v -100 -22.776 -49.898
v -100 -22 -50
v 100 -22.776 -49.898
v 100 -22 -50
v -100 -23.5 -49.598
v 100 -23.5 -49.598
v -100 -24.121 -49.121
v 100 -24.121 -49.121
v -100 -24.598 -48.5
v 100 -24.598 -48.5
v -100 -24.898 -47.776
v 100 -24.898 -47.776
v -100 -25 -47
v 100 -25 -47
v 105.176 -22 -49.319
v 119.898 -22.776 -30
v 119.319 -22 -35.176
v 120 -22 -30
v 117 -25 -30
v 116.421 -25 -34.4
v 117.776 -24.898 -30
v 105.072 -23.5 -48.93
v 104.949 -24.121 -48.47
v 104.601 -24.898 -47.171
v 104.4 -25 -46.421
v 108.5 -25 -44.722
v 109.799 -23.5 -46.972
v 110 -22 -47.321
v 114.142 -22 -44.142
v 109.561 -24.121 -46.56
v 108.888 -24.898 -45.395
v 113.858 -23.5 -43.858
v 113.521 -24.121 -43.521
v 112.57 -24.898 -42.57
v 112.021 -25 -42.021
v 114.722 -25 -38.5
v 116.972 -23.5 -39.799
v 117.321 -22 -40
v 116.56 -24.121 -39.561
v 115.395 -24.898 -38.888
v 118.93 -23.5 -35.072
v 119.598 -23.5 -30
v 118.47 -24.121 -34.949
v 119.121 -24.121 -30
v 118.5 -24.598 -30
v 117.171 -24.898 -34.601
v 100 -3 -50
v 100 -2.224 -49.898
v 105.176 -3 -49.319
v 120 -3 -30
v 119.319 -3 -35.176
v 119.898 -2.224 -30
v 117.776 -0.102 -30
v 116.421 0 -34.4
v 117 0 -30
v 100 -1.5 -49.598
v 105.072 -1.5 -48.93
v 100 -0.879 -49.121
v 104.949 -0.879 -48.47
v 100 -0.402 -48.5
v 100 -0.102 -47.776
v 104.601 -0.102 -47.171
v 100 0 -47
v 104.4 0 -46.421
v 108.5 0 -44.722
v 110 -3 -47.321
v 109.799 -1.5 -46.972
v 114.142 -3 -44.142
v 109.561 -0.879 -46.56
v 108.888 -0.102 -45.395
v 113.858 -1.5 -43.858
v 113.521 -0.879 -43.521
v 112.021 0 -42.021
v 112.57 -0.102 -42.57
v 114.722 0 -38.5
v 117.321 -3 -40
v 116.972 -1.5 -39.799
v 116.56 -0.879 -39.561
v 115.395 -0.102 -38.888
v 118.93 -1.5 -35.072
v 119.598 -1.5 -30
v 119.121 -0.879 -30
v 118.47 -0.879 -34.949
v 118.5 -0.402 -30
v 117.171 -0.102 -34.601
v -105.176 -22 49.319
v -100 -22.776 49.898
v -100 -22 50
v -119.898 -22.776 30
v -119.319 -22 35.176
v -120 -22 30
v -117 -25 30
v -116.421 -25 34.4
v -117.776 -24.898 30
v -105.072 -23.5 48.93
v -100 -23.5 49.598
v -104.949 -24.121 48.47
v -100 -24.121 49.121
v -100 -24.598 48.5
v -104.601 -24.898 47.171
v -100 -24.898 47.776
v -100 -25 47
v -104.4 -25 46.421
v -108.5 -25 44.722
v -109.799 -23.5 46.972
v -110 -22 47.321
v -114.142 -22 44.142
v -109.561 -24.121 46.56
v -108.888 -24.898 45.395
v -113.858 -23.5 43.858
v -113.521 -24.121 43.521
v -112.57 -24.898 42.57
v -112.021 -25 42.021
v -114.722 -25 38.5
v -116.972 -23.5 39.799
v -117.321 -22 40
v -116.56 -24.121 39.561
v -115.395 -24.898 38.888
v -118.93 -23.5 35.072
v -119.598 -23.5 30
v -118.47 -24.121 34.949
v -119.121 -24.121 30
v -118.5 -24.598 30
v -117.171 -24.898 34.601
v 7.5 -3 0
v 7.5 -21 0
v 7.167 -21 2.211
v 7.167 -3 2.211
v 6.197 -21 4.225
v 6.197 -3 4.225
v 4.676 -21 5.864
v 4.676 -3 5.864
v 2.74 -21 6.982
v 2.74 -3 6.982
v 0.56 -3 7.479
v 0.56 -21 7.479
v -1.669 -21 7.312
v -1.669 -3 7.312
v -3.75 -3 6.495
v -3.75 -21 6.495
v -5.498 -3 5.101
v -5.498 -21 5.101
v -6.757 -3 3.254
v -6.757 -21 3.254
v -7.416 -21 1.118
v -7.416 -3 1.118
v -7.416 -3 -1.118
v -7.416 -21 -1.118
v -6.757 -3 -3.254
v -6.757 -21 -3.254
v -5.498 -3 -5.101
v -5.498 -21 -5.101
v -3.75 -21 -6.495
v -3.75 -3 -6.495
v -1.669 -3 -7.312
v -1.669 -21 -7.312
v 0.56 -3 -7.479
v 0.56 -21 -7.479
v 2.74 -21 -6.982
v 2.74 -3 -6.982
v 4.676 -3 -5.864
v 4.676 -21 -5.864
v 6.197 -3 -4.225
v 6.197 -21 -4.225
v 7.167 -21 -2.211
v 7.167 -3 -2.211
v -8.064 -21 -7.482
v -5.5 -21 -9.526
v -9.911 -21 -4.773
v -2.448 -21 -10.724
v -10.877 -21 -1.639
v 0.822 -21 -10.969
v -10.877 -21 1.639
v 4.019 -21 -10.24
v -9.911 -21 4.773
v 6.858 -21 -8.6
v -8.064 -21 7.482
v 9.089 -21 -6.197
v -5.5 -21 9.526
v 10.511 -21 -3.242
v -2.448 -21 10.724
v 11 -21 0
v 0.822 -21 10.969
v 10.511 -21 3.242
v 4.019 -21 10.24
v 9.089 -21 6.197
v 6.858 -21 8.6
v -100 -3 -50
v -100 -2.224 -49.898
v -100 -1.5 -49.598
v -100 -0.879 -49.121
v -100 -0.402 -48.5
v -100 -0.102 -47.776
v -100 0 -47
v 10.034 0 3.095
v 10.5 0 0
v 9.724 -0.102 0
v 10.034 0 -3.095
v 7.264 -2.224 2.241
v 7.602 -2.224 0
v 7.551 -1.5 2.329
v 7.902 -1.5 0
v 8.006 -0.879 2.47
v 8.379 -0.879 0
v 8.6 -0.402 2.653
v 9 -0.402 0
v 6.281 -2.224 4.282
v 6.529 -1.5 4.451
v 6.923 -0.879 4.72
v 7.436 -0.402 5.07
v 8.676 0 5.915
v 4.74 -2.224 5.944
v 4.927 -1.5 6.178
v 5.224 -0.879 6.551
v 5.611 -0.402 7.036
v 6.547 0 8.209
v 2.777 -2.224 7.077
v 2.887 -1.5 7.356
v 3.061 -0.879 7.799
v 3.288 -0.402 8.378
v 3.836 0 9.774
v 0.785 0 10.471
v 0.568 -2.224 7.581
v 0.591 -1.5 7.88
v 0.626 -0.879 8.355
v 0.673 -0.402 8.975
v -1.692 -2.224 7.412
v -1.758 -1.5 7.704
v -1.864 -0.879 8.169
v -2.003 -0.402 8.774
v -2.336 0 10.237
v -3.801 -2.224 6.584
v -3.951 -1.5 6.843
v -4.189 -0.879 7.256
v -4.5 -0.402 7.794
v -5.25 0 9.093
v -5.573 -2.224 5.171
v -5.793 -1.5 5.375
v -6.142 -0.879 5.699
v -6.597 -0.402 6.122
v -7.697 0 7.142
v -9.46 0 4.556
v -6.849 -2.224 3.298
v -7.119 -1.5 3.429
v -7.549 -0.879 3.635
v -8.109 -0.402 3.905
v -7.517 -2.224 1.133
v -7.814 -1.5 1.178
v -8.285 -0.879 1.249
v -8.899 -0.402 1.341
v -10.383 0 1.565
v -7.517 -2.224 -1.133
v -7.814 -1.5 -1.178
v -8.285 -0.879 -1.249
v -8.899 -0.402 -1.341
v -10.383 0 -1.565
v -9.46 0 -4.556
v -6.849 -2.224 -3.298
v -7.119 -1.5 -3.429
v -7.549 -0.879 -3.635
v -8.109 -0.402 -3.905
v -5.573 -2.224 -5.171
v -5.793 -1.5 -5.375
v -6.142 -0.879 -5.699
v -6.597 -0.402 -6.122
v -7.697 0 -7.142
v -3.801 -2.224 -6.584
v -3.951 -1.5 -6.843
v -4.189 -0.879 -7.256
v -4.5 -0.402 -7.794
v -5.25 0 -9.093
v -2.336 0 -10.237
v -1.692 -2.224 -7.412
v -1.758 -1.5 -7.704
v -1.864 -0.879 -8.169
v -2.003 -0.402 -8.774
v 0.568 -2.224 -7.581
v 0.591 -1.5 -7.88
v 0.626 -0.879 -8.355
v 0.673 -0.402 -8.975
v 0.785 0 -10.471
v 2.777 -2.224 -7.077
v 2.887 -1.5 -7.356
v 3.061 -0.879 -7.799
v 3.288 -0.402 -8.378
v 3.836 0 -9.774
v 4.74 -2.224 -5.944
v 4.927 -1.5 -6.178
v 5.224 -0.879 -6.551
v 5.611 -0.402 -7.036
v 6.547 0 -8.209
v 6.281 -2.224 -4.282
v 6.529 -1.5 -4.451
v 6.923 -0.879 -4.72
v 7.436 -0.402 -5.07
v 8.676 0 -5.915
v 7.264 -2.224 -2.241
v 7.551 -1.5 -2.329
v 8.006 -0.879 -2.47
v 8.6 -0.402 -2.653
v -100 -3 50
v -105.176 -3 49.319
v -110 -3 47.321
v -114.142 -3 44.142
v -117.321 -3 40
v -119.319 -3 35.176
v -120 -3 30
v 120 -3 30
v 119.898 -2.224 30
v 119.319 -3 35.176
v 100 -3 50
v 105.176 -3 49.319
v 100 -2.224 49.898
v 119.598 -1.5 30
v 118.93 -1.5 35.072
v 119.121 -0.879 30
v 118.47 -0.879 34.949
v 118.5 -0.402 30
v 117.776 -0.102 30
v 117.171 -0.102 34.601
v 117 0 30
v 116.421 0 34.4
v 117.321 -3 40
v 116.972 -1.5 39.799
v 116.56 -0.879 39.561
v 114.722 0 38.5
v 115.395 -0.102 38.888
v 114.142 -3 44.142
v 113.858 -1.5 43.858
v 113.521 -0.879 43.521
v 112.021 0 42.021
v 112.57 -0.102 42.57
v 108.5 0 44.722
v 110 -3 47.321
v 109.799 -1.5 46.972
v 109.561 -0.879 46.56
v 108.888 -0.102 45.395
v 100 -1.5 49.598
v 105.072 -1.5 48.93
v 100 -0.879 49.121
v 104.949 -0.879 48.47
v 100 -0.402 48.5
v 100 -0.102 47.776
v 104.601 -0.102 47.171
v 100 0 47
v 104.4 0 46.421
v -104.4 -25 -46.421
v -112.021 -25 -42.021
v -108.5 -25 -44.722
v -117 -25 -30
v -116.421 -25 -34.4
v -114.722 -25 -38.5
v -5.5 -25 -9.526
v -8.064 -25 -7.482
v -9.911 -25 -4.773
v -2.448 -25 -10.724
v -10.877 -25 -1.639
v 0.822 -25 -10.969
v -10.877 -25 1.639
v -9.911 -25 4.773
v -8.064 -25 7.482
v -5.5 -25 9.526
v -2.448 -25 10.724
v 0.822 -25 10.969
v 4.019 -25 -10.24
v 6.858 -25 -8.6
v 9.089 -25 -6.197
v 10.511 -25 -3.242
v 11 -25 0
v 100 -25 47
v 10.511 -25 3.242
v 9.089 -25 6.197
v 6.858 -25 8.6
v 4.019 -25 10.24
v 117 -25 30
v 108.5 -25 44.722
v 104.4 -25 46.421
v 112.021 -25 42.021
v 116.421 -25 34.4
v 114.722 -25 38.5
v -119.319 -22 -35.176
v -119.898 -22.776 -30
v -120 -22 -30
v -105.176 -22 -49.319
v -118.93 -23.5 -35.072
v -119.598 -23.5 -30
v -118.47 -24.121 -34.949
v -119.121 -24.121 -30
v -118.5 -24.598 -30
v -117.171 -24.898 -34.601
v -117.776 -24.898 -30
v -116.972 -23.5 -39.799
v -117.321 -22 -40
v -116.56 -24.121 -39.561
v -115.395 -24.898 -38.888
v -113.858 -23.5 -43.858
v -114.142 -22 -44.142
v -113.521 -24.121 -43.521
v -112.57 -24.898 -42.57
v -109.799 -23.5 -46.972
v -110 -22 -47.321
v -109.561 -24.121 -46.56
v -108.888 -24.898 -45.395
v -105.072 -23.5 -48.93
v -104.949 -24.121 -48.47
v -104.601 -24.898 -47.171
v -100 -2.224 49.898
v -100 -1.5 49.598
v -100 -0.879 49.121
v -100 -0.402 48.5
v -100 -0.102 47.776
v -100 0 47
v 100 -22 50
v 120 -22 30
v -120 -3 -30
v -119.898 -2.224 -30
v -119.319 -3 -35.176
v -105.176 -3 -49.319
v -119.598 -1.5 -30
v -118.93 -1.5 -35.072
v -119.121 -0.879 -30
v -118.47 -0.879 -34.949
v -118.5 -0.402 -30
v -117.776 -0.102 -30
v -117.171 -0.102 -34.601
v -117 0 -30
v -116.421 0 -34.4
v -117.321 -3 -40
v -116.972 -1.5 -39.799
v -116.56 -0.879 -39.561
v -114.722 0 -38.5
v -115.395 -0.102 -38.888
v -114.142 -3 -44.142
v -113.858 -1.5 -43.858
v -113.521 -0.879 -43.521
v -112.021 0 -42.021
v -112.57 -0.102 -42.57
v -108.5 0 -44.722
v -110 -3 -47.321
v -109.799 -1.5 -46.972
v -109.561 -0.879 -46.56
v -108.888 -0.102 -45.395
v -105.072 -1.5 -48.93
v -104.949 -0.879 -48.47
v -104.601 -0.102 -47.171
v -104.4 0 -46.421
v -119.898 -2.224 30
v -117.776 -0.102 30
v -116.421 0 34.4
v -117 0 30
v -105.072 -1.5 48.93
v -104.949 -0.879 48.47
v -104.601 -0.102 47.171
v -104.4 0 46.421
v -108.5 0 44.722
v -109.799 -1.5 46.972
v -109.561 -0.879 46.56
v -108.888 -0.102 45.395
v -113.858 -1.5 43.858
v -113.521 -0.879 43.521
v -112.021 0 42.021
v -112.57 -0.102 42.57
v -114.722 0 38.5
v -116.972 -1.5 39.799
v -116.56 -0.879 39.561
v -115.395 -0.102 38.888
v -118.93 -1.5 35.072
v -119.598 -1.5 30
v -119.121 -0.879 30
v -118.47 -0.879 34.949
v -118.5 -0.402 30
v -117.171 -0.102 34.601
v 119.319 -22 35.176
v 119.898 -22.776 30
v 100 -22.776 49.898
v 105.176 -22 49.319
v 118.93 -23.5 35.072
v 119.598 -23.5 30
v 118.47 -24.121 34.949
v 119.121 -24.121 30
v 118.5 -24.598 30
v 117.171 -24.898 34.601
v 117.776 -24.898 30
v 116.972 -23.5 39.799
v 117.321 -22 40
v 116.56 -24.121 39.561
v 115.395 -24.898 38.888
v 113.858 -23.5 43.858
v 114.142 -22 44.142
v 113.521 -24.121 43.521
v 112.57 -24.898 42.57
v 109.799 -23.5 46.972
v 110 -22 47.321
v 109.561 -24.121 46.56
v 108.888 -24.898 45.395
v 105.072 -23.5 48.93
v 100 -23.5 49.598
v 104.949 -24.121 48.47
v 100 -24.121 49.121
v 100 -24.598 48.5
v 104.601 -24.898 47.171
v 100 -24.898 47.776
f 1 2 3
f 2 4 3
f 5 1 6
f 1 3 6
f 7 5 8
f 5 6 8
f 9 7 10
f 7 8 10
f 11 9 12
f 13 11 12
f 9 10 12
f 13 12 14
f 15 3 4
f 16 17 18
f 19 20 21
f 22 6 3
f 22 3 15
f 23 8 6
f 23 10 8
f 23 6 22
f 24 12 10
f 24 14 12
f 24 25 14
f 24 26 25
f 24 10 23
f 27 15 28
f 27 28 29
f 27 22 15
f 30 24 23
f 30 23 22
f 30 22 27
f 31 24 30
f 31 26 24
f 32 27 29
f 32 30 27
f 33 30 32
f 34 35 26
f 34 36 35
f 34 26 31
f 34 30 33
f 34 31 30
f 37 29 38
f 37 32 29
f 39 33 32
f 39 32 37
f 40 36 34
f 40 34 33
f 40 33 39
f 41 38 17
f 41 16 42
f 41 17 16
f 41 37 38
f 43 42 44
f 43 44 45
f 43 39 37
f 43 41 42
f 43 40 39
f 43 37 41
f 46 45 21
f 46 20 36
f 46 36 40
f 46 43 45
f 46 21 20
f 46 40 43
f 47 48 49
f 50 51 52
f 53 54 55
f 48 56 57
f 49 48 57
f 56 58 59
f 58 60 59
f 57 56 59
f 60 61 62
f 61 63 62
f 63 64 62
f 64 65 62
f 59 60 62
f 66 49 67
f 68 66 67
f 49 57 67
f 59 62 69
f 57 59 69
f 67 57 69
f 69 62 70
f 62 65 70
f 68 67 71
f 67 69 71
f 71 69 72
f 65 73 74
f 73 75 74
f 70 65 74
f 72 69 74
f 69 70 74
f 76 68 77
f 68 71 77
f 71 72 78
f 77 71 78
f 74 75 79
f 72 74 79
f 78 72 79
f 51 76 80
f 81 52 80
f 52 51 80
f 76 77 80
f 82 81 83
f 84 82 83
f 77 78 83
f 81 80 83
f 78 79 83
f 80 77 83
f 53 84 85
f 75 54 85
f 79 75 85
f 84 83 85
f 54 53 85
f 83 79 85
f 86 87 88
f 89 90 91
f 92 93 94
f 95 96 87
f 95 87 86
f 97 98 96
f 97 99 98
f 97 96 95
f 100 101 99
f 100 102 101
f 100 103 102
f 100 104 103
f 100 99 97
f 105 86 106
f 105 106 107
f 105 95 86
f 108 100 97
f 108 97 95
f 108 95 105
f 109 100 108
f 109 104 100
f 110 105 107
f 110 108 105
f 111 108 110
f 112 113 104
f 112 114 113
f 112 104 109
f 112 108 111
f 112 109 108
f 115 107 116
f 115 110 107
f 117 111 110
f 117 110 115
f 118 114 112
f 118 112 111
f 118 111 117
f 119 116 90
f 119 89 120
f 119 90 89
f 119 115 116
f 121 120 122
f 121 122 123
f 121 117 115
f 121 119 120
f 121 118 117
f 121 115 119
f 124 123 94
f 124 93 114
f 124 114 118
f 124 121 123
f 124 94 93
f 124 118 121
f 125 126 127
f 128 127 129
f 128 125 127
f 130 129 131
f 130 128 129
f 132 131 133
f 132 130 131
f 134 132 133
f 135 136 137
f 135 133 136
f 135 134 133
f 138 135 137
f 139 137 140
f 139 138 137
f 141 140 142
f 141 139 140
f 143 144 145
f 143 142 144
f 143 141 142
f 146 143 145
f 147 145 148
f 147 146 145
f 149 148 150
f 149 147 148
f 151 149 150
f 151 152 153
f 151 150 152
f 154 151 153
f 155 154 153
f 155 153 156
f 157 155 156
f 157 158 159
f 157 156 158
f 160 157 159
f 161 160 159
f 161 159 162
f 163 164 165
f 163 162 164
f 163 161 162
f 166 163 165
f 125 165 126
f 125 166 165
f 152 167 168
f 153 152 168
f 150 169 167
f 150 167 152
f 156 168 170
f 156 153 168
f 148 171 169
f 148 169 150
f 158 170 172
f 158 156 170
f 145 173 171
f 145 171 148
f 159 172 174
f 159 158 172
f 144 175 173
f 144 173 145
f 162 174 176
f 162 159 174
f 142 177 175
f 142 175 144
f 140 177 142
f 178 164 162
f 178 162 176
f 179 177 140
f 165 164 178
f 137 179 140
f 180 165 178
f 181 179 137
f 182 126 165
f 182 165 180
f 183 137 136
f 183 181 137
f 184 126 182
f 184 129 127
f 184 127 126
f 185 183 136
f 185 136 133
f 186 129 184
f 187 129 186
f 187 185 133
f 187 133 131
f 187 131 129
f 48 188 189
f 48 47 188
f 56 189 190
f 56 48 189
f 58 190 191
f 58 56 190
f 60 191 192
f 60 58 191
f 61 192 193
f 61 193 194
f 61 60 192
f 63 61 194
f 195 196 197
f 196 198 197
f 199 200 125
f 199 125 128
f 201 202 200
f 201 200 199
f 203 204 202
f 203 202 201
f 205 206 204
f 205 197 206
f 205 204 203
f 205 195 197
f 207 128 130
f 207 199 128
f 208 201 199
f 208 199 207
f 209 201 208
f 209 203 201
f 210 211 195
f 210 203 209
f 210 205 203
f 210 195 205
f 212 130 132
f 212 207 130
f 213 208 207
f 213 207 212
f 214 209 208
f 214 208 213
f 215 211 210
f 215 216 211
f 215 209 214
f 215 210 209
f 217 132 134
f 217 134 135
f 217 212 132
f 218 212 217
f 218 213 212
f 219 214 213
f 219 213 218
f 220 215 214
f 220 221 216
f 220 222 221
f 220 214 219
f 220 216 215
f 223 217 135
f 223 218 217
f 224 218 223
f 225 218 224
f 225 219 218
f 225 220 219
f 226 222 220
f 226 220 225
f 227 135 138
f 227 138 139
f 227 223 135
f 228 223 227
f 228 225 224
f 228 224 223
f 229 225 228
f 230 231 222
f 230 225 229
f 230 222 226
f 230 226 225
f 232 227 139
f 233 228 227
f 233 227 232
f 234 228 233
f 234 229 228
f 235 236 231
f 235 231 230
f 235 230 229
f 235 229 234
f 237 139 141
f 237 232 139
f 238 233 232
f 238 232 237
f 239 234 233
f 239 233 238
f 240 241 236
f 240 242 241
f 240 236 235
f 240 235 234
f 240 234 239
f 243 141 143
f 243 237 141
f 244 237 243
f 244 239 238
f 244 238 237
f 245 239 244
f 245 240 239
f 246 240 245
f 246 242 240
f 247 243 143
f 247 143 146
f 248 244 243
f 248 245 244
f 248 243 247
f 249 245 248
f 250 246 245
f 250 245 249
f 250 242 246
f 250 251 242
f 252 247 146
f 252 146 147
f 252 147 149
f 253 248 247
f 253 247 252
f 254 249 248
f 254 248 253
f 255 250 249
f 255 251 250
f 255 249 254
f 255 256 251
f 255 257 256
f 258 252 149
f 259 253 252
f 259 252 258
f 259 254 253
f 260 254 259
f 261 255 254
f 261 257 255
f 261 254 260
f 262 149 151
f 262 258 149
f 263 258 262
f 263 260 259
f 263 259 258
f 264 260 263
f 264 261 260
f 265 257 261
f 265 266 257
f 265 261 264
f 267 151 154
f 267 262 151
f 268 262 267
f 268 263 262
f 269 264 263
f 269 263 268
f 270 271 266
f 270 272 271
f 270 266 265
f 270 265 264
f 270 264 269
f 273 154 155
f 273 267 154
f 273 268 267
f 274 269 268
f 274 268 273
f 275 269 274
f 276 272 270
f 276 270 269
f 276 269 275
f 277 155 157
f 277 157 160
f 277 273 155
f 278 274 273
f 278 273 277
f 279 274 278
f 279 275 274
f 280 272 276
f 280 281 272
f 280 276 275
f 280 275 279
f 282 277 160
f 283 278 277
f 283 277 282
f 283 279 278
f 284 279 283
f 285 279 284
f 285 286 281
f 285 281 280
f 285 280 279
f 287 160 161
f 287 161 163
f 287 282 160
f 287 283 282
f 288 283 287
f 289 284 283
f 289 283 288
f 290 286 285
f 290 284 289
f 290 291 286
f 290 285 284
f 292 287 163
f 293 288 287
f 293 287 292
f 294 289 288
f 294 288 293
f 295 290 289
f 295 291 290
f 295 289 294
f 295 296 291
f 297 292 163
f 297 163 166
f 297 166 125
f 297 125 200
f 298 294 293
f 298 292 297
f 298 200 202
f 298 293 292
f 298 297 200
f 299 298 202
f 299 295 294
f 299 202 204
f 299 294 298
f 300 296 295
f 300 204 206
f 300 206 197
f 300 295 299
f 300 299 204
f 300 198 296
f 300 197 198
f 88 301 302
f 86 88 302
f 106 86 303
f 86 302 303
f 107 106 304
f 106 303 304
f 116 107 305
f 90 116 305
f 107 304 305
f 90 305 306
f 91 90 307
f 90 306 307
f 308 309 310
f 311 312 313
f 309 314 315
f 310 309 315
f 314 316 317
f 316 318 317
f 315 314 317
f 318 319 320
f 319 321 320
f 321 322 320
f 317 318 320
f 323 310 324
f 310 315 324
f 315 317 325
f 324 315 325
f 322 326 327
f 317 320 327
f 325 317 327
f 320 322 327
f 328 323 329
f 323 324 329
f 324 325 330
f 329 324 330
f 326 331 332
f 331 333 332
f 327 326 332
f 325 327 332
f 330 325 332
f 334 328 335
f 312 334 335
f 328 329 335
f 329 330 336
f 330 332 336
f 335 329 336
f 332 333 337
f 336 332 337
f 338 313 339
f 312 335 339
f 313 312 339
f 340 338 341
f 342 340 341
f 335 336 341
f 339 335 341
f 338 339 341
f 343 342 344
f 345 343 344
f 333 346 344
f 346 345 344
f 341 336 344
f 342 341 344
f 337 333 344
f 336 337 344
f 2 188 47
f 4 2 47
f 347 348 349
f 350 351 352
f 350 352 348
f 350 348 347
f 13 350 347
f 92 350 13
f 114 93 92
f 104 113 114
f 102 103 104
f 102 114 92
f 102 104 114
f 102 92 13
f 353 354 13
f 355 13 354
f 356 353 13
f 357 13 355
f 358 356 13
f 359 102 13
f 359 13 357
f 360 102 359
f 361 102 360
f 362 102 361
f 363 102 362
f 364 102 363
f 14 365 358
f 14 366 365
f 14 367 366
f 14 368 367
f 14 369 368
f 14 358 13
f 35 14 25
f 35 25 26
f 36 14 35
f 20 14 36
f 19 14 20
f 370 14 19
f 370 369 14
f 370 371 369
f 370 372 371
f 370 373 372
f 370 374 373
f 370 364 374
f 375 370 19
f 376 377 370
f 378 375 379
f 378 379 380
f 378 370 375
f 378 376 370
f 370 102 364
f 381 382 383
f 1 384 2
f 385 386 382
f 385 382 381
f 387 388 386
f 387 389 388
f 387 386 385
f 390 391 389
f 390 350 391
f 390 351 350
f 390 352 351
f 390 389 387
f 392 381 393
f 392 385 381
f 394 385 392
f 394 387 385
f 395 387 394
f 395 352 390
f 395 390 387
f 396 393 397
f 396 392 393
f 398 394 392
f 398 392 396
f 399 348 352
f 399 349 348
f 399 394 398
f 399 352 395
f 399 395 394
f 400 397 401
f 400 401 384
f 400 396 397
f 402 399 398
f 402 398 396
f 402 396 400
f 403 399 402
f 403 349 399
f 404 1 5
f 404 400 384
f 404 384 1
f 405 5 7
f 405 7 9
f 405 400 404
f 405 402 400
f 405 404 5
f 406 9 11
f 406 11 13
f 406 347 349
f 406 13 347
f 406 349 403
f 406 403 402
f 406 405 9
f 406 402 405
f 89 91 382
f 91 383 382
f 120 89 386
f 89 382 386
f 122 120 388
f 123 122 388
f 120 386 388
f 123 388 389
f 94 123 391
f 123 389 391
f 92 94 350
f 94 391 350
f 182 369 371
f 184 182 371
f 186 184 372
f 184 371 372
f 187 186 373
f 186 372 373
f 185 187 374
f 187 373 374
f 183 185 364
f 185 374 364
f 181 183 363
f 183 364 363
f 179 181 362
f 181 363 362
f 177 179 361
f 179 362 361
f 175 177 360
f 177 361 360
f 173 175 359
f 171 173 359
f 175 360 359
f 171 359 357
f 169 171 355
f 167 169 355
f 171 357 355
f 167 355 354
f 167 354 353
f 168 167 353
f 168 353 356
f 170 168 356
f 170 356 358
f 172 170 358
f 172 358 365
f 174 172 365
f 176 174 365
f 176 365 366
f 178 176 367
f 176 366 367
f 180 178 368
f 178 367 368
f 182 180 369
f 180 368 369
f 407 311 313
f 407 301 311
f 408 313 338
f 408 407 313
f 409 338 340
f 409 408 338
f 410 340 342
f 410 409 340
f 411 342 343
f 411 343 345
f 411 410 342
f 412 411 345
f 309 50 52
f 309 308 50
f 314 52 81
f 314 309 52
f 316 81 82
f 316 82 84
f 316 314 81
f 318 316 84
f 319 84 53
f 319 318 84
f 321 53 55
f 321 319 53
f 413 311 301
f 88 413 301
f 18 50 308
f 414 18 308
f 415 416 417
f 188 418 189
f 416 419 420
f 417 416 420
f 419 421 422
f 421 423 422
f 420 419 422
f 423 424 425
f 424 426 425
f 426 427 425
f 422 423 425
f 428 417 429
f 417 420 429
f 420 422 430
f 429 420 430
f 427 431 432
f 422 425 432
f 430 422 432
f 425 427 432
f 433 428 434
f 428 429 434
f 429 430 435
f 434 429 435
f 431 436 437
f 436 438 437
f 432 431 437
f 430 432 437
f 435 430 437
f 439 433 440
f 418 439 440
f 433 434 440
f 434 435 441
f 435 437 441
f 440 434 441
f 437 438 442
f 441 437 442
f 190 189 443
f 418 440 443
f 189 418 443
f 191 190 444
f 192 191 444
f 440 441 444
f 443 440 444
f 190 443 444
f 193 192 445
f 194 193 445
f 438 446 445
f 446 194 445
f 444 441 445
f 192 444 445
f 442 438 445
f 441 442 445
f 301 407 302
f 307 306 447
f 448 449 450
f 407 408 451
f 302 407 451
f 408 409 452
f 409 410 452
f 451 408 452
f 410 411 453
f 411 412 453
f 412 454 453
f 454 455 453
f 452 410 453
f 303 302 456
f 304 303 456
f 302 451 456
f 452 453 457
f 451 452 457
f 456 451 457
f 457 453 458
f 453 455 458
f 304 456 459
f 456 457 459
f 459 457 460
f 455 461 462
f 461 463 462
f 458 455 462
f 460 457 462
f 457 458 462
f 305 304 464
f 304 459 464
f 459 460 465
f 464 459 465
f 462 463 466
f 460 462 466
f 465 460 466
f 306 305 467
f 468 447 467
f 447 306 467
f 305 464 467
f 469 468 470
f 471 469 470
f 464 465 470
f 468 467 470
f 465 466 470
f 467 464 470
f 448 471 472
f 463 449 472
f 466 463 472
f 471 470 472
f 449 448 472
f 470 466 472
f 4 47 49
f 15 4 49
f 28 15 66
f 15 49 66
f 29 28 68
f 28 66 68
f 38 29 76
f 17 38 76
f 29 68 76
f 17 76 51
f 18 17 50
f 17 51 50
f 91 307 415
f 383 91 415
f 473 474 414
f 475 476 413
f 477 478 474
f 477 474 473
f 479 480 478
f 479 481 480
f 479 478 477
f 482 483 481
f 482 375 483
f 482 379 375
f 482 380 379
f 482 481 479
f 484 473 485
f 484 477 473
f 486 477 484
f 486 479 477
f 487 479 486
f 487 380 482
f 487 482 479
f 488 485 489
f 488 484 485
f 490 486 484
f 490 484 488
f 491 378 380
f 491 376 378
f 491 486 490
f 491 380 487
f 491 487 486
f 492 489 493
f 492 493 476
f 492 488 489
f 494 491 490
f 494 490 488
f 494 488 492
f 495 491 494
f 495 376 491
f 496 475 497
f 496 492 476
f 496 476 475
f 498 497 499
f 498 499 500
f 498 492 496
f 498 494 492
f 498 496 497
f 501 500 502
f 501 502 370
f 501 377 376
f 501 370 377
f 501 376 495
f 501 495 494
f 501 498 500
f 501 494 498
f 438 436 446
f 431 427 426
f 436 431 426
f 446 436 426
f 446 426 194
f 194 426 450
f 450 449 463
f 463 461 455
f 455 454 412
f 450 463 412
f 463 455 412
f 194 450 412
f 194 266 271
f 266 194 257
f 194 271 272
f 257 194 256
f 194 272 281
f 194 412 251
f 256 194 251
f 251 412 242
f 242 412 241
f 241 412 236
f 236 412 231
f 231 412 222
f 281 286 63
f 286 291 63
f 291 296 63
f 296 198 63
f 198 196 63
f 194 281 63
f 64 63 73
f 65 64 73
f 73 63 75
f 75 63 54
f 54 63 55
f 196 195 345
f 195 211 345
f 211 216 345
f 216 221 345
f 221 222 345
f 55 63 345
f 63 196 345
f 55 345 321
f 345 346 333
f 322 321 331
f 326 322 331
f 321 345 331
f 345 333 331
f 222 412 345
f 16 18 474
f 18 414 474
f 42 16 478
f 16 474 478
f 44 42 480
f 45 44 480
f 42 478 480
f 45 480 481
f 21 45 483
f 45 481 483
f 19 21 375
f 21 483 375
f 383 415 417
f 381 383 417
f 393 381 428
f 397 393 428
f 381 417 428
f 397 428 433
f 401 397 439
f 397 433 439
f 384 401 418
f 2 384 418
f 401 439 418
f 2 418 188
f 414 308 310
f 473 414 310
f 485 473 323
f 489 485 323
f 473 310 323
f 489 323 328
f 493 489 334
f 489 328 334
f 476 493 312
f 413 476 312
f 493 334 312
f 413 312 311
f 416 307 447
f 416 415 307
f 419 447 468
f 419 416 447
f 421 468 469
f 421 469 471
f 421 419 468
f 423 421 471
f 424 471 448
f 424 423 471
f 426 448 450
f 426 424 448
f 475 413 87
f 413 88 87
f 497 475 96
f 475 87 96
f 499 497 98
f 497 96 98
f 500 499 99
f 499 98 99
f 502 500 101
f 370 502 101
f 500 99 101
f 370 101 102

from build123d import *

# Parameters (mm, degrees)
F0_R     = 7.5
F1_DEPTH = 25
F2_R     = 3
F3_R     = 11
F4_DEPTH = 4


with BuildPart() as f1:
    # F0 (on Front) → F1 (new body)
    with BuildSketch(Plane.XZ):
        with BuildLine():
            Line((100, 50), (-100, 50))
            ThreePointArc((-100, 50), (-114.142136, 44.142136), (-120, 30))
            Line((-120, 30), (-120, -30))
            ThreePointArc((-120, -30), (-114.142136, -44.142136), (-100, -50))
            Line((-100, -50), (100, -50))
            ThreePointArc((100, -50), (114.142136, -44.142136), (120, -30))
            Line((120, -30), (120, 30))
            ThreePointArc((120, 30), (114.142136, 44.142136), (100, 50))
        make_face()
        Circle(F0_R, mode=Mode.SUBTRACT)
    extrude(amount=F1_DEPTH)

    # F2
    f2_edges = [f1.edges().sort_by_distance(p)[0] for p in [
        (0, -25, 50),
        (0, 0, 50),
        (-114.142136, 0, 44.142136),
        (-120, 0, 0),
        (-114.142136, 0, -44.142136),
        (0, 0, -50),
        (114.142136, 0, -44.142136),
        (120, 0, 0),
        (114.142136, 0, 44.142136),
        (-7.5, 0, 0),
    ]]
    fillet(f2_edges, radius=F2_R)

    # F3 (on face) → F4 (cut)
    with BuildSketch(Plane.XZ.offset(25)):
        Circle(F3_R)
    extrude(amount=-F4_DEPTH, mode=Mode.SUBTRACT)


solid = f1.part
